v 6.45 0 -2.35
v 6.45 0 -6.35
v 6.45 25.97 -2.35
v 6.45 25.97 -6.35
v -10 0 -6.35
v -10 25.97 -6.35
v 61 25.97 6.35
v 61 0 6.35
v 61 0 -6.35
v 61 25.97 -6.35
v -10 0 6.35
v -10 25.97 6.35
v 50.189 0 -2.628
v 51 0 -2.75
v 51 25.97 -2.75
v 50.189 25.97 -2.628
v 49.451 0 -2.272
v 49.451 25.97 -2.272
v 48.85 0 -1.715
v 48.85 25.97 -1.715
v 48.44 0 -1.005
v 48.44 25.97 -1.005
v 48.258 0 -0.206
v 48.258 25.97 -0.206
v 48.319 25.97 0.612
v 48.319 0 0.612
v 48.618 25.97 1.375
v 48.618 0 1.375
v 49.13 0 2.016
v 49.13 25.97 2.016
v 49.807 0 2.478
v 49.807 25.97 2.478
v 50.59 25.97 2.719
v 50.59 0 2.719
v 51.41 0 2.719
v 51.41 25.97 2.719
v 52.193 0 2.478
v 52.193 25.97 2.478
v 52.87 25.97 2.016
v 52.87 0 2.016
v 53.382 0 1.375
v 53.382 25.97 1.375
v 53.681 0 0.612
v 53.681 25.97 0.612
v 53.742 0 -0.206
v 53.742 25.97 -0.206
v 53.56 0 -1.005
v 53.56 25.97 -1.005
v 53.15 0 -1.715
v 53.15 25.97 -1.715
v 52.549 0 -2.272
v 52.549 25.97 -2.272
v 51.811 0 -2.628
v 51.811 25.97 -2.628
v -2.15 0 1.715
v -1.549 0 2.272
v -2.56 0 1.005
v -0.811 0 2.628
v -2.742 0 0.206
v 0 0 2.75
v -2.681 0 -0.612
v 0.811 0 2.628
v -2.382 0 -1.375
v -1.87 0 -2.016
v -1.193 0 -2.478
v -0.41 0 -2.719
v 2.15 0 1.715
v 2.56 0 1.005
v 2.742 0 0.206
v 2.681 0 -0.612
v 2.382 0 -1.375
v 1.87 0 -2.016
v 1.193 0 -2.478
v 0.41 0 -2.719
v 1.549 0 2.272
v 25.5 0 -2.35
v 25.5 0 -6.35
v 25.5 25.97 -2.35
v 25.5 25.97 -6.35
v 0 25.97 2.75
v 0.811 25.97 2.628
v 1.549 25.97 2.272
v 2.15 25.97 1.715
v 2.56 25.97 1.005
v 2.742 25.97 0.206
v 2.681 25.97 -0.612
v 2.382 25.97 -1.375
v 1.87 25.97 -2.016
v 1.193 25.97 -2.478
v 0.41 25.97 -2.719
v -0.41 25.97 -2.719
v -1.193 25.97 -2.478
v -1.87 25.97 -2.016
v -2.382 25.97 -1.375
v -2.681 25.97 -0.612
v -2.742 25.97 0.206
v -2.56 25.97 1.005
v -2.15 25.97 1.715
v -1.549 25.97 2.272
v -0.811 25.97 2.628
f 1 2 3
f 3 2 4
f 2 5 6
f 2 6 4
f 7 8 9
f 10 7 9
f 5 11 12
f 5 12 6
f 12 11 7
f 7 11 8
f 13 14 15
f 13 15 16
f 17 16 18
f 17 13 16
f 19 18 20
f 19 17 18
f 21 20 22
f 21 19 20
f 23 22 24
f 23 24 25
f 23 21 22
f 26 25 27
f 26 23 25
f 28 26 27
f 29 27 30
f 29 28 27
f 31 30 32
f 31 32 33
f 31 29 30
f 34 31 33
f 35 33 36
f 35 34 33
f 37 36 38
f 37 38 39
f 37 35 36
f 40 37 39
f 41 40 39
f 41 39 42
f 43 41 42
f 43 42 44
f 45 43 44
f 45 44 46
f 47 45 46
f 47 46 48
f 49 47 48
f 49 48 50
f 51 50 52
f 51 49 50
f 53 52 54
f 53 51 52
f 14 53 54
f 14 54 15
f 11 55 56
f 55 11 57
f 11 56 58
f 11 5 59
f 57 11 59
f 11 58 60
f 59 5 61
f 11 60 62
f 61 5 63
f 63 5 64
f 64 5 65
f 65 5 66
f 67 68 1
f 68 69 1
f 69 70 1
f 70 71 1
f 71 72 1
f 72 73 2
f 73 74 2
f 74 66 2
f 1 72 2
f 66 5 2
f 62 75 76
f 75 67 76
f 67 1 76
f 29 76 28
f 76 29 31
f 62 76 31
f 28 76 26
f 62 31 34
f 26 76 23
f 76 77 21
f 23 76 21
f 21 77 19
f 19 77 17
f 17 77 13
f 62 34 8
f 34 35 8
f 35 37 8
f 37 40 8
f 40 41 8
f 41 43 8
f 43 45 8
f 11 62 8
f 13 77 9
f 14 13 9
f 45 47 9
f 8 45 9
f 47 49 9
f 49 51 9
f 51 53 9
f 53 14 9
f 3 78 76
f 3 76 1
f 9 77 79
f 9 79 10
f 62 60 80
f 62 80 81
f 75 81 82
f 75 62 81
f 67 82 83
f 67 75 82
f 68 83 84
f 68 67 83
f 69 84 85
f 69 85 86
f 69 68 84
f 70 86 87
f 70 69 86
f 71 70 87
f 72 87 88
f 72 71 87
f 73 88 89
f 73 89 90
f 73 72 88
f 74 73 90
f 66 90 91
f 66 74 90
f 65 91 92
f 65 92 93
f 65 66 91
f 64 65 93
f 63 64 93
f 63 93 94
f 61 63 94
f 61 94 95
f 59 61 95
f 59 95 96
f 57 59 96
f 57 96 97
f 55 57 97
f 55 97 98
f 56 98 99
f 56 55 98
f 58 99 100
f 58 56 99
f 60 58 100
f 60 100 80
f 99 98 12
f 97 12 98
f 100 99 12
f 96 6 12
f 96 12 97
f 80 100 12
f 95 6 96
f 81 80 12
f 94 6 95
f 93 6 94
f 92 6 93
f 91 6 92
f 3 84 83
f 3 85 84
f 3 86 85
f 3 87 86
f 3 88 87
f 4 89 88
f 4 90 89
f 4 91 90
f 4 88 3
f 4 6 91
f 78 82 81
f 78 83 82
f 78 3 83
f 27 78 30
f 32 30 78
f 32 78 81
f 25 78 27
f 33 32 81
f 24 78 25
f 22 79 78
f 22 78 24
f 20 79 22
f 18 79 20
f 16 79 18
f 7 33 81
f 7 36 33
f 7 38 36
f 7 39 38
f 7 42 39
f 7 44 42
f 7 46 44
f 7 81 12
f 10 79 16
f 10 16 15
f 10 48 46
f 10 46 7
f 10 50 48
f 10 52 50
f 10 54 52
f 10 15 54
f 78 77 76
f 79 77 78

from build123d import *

# Parameters (mm, degrees)
SKETCH1_W           = 71
SKETCH1_H           = 12.7
SKETCH1_R           = 2.75
BOSS_EXTRUDE1_DEPTH = 25.97
SKETCH2_W           = 19.05
SKETCH2_H           = 25.97
CUT_EXTRUDE1_DEPTH  = 4


with BuildPart() as part:
    # Sketch1 → Boss-Extrude1 (new body)
    with BuildSketch(Plane(origin=(0, 0, 0), x_dir=(1, 0, 0), z_dir=(0, 1, 0))):
        with Locations((25.5, 0)):
            Rectangle(SKETCH1_W, SKETCH1_H)
        with Locations(Location((0, 0, 0), (0, 0, 270))):
            Circle(SKETCH1_R, mode=Mode.SUBTRACT)
        with Locations(Location((51, 0, 0), (0, 0, 90))):
            Circle(SKETCH1_R, mode=Mode.SUBTRACT)
    extrude(amount=BOSS_EXTRUDE1_DEPTH)

    # Sketch2 → Cut-Extrude1 (cut)
    with BuildSketch(Plane(origin=(0, 0, -6.35), x_dir=(-1, 0, 0), z_dir=(0, 0, -1))):
        with Locations((-15.975, 12.985)):
            Rectangle(SKETCH2_W, SKETCH2_H)
    extrude(amount=-CUT_EXTRUDE1_DEPTH, mode=Mode.SUBTRACT)


solid = part.part
